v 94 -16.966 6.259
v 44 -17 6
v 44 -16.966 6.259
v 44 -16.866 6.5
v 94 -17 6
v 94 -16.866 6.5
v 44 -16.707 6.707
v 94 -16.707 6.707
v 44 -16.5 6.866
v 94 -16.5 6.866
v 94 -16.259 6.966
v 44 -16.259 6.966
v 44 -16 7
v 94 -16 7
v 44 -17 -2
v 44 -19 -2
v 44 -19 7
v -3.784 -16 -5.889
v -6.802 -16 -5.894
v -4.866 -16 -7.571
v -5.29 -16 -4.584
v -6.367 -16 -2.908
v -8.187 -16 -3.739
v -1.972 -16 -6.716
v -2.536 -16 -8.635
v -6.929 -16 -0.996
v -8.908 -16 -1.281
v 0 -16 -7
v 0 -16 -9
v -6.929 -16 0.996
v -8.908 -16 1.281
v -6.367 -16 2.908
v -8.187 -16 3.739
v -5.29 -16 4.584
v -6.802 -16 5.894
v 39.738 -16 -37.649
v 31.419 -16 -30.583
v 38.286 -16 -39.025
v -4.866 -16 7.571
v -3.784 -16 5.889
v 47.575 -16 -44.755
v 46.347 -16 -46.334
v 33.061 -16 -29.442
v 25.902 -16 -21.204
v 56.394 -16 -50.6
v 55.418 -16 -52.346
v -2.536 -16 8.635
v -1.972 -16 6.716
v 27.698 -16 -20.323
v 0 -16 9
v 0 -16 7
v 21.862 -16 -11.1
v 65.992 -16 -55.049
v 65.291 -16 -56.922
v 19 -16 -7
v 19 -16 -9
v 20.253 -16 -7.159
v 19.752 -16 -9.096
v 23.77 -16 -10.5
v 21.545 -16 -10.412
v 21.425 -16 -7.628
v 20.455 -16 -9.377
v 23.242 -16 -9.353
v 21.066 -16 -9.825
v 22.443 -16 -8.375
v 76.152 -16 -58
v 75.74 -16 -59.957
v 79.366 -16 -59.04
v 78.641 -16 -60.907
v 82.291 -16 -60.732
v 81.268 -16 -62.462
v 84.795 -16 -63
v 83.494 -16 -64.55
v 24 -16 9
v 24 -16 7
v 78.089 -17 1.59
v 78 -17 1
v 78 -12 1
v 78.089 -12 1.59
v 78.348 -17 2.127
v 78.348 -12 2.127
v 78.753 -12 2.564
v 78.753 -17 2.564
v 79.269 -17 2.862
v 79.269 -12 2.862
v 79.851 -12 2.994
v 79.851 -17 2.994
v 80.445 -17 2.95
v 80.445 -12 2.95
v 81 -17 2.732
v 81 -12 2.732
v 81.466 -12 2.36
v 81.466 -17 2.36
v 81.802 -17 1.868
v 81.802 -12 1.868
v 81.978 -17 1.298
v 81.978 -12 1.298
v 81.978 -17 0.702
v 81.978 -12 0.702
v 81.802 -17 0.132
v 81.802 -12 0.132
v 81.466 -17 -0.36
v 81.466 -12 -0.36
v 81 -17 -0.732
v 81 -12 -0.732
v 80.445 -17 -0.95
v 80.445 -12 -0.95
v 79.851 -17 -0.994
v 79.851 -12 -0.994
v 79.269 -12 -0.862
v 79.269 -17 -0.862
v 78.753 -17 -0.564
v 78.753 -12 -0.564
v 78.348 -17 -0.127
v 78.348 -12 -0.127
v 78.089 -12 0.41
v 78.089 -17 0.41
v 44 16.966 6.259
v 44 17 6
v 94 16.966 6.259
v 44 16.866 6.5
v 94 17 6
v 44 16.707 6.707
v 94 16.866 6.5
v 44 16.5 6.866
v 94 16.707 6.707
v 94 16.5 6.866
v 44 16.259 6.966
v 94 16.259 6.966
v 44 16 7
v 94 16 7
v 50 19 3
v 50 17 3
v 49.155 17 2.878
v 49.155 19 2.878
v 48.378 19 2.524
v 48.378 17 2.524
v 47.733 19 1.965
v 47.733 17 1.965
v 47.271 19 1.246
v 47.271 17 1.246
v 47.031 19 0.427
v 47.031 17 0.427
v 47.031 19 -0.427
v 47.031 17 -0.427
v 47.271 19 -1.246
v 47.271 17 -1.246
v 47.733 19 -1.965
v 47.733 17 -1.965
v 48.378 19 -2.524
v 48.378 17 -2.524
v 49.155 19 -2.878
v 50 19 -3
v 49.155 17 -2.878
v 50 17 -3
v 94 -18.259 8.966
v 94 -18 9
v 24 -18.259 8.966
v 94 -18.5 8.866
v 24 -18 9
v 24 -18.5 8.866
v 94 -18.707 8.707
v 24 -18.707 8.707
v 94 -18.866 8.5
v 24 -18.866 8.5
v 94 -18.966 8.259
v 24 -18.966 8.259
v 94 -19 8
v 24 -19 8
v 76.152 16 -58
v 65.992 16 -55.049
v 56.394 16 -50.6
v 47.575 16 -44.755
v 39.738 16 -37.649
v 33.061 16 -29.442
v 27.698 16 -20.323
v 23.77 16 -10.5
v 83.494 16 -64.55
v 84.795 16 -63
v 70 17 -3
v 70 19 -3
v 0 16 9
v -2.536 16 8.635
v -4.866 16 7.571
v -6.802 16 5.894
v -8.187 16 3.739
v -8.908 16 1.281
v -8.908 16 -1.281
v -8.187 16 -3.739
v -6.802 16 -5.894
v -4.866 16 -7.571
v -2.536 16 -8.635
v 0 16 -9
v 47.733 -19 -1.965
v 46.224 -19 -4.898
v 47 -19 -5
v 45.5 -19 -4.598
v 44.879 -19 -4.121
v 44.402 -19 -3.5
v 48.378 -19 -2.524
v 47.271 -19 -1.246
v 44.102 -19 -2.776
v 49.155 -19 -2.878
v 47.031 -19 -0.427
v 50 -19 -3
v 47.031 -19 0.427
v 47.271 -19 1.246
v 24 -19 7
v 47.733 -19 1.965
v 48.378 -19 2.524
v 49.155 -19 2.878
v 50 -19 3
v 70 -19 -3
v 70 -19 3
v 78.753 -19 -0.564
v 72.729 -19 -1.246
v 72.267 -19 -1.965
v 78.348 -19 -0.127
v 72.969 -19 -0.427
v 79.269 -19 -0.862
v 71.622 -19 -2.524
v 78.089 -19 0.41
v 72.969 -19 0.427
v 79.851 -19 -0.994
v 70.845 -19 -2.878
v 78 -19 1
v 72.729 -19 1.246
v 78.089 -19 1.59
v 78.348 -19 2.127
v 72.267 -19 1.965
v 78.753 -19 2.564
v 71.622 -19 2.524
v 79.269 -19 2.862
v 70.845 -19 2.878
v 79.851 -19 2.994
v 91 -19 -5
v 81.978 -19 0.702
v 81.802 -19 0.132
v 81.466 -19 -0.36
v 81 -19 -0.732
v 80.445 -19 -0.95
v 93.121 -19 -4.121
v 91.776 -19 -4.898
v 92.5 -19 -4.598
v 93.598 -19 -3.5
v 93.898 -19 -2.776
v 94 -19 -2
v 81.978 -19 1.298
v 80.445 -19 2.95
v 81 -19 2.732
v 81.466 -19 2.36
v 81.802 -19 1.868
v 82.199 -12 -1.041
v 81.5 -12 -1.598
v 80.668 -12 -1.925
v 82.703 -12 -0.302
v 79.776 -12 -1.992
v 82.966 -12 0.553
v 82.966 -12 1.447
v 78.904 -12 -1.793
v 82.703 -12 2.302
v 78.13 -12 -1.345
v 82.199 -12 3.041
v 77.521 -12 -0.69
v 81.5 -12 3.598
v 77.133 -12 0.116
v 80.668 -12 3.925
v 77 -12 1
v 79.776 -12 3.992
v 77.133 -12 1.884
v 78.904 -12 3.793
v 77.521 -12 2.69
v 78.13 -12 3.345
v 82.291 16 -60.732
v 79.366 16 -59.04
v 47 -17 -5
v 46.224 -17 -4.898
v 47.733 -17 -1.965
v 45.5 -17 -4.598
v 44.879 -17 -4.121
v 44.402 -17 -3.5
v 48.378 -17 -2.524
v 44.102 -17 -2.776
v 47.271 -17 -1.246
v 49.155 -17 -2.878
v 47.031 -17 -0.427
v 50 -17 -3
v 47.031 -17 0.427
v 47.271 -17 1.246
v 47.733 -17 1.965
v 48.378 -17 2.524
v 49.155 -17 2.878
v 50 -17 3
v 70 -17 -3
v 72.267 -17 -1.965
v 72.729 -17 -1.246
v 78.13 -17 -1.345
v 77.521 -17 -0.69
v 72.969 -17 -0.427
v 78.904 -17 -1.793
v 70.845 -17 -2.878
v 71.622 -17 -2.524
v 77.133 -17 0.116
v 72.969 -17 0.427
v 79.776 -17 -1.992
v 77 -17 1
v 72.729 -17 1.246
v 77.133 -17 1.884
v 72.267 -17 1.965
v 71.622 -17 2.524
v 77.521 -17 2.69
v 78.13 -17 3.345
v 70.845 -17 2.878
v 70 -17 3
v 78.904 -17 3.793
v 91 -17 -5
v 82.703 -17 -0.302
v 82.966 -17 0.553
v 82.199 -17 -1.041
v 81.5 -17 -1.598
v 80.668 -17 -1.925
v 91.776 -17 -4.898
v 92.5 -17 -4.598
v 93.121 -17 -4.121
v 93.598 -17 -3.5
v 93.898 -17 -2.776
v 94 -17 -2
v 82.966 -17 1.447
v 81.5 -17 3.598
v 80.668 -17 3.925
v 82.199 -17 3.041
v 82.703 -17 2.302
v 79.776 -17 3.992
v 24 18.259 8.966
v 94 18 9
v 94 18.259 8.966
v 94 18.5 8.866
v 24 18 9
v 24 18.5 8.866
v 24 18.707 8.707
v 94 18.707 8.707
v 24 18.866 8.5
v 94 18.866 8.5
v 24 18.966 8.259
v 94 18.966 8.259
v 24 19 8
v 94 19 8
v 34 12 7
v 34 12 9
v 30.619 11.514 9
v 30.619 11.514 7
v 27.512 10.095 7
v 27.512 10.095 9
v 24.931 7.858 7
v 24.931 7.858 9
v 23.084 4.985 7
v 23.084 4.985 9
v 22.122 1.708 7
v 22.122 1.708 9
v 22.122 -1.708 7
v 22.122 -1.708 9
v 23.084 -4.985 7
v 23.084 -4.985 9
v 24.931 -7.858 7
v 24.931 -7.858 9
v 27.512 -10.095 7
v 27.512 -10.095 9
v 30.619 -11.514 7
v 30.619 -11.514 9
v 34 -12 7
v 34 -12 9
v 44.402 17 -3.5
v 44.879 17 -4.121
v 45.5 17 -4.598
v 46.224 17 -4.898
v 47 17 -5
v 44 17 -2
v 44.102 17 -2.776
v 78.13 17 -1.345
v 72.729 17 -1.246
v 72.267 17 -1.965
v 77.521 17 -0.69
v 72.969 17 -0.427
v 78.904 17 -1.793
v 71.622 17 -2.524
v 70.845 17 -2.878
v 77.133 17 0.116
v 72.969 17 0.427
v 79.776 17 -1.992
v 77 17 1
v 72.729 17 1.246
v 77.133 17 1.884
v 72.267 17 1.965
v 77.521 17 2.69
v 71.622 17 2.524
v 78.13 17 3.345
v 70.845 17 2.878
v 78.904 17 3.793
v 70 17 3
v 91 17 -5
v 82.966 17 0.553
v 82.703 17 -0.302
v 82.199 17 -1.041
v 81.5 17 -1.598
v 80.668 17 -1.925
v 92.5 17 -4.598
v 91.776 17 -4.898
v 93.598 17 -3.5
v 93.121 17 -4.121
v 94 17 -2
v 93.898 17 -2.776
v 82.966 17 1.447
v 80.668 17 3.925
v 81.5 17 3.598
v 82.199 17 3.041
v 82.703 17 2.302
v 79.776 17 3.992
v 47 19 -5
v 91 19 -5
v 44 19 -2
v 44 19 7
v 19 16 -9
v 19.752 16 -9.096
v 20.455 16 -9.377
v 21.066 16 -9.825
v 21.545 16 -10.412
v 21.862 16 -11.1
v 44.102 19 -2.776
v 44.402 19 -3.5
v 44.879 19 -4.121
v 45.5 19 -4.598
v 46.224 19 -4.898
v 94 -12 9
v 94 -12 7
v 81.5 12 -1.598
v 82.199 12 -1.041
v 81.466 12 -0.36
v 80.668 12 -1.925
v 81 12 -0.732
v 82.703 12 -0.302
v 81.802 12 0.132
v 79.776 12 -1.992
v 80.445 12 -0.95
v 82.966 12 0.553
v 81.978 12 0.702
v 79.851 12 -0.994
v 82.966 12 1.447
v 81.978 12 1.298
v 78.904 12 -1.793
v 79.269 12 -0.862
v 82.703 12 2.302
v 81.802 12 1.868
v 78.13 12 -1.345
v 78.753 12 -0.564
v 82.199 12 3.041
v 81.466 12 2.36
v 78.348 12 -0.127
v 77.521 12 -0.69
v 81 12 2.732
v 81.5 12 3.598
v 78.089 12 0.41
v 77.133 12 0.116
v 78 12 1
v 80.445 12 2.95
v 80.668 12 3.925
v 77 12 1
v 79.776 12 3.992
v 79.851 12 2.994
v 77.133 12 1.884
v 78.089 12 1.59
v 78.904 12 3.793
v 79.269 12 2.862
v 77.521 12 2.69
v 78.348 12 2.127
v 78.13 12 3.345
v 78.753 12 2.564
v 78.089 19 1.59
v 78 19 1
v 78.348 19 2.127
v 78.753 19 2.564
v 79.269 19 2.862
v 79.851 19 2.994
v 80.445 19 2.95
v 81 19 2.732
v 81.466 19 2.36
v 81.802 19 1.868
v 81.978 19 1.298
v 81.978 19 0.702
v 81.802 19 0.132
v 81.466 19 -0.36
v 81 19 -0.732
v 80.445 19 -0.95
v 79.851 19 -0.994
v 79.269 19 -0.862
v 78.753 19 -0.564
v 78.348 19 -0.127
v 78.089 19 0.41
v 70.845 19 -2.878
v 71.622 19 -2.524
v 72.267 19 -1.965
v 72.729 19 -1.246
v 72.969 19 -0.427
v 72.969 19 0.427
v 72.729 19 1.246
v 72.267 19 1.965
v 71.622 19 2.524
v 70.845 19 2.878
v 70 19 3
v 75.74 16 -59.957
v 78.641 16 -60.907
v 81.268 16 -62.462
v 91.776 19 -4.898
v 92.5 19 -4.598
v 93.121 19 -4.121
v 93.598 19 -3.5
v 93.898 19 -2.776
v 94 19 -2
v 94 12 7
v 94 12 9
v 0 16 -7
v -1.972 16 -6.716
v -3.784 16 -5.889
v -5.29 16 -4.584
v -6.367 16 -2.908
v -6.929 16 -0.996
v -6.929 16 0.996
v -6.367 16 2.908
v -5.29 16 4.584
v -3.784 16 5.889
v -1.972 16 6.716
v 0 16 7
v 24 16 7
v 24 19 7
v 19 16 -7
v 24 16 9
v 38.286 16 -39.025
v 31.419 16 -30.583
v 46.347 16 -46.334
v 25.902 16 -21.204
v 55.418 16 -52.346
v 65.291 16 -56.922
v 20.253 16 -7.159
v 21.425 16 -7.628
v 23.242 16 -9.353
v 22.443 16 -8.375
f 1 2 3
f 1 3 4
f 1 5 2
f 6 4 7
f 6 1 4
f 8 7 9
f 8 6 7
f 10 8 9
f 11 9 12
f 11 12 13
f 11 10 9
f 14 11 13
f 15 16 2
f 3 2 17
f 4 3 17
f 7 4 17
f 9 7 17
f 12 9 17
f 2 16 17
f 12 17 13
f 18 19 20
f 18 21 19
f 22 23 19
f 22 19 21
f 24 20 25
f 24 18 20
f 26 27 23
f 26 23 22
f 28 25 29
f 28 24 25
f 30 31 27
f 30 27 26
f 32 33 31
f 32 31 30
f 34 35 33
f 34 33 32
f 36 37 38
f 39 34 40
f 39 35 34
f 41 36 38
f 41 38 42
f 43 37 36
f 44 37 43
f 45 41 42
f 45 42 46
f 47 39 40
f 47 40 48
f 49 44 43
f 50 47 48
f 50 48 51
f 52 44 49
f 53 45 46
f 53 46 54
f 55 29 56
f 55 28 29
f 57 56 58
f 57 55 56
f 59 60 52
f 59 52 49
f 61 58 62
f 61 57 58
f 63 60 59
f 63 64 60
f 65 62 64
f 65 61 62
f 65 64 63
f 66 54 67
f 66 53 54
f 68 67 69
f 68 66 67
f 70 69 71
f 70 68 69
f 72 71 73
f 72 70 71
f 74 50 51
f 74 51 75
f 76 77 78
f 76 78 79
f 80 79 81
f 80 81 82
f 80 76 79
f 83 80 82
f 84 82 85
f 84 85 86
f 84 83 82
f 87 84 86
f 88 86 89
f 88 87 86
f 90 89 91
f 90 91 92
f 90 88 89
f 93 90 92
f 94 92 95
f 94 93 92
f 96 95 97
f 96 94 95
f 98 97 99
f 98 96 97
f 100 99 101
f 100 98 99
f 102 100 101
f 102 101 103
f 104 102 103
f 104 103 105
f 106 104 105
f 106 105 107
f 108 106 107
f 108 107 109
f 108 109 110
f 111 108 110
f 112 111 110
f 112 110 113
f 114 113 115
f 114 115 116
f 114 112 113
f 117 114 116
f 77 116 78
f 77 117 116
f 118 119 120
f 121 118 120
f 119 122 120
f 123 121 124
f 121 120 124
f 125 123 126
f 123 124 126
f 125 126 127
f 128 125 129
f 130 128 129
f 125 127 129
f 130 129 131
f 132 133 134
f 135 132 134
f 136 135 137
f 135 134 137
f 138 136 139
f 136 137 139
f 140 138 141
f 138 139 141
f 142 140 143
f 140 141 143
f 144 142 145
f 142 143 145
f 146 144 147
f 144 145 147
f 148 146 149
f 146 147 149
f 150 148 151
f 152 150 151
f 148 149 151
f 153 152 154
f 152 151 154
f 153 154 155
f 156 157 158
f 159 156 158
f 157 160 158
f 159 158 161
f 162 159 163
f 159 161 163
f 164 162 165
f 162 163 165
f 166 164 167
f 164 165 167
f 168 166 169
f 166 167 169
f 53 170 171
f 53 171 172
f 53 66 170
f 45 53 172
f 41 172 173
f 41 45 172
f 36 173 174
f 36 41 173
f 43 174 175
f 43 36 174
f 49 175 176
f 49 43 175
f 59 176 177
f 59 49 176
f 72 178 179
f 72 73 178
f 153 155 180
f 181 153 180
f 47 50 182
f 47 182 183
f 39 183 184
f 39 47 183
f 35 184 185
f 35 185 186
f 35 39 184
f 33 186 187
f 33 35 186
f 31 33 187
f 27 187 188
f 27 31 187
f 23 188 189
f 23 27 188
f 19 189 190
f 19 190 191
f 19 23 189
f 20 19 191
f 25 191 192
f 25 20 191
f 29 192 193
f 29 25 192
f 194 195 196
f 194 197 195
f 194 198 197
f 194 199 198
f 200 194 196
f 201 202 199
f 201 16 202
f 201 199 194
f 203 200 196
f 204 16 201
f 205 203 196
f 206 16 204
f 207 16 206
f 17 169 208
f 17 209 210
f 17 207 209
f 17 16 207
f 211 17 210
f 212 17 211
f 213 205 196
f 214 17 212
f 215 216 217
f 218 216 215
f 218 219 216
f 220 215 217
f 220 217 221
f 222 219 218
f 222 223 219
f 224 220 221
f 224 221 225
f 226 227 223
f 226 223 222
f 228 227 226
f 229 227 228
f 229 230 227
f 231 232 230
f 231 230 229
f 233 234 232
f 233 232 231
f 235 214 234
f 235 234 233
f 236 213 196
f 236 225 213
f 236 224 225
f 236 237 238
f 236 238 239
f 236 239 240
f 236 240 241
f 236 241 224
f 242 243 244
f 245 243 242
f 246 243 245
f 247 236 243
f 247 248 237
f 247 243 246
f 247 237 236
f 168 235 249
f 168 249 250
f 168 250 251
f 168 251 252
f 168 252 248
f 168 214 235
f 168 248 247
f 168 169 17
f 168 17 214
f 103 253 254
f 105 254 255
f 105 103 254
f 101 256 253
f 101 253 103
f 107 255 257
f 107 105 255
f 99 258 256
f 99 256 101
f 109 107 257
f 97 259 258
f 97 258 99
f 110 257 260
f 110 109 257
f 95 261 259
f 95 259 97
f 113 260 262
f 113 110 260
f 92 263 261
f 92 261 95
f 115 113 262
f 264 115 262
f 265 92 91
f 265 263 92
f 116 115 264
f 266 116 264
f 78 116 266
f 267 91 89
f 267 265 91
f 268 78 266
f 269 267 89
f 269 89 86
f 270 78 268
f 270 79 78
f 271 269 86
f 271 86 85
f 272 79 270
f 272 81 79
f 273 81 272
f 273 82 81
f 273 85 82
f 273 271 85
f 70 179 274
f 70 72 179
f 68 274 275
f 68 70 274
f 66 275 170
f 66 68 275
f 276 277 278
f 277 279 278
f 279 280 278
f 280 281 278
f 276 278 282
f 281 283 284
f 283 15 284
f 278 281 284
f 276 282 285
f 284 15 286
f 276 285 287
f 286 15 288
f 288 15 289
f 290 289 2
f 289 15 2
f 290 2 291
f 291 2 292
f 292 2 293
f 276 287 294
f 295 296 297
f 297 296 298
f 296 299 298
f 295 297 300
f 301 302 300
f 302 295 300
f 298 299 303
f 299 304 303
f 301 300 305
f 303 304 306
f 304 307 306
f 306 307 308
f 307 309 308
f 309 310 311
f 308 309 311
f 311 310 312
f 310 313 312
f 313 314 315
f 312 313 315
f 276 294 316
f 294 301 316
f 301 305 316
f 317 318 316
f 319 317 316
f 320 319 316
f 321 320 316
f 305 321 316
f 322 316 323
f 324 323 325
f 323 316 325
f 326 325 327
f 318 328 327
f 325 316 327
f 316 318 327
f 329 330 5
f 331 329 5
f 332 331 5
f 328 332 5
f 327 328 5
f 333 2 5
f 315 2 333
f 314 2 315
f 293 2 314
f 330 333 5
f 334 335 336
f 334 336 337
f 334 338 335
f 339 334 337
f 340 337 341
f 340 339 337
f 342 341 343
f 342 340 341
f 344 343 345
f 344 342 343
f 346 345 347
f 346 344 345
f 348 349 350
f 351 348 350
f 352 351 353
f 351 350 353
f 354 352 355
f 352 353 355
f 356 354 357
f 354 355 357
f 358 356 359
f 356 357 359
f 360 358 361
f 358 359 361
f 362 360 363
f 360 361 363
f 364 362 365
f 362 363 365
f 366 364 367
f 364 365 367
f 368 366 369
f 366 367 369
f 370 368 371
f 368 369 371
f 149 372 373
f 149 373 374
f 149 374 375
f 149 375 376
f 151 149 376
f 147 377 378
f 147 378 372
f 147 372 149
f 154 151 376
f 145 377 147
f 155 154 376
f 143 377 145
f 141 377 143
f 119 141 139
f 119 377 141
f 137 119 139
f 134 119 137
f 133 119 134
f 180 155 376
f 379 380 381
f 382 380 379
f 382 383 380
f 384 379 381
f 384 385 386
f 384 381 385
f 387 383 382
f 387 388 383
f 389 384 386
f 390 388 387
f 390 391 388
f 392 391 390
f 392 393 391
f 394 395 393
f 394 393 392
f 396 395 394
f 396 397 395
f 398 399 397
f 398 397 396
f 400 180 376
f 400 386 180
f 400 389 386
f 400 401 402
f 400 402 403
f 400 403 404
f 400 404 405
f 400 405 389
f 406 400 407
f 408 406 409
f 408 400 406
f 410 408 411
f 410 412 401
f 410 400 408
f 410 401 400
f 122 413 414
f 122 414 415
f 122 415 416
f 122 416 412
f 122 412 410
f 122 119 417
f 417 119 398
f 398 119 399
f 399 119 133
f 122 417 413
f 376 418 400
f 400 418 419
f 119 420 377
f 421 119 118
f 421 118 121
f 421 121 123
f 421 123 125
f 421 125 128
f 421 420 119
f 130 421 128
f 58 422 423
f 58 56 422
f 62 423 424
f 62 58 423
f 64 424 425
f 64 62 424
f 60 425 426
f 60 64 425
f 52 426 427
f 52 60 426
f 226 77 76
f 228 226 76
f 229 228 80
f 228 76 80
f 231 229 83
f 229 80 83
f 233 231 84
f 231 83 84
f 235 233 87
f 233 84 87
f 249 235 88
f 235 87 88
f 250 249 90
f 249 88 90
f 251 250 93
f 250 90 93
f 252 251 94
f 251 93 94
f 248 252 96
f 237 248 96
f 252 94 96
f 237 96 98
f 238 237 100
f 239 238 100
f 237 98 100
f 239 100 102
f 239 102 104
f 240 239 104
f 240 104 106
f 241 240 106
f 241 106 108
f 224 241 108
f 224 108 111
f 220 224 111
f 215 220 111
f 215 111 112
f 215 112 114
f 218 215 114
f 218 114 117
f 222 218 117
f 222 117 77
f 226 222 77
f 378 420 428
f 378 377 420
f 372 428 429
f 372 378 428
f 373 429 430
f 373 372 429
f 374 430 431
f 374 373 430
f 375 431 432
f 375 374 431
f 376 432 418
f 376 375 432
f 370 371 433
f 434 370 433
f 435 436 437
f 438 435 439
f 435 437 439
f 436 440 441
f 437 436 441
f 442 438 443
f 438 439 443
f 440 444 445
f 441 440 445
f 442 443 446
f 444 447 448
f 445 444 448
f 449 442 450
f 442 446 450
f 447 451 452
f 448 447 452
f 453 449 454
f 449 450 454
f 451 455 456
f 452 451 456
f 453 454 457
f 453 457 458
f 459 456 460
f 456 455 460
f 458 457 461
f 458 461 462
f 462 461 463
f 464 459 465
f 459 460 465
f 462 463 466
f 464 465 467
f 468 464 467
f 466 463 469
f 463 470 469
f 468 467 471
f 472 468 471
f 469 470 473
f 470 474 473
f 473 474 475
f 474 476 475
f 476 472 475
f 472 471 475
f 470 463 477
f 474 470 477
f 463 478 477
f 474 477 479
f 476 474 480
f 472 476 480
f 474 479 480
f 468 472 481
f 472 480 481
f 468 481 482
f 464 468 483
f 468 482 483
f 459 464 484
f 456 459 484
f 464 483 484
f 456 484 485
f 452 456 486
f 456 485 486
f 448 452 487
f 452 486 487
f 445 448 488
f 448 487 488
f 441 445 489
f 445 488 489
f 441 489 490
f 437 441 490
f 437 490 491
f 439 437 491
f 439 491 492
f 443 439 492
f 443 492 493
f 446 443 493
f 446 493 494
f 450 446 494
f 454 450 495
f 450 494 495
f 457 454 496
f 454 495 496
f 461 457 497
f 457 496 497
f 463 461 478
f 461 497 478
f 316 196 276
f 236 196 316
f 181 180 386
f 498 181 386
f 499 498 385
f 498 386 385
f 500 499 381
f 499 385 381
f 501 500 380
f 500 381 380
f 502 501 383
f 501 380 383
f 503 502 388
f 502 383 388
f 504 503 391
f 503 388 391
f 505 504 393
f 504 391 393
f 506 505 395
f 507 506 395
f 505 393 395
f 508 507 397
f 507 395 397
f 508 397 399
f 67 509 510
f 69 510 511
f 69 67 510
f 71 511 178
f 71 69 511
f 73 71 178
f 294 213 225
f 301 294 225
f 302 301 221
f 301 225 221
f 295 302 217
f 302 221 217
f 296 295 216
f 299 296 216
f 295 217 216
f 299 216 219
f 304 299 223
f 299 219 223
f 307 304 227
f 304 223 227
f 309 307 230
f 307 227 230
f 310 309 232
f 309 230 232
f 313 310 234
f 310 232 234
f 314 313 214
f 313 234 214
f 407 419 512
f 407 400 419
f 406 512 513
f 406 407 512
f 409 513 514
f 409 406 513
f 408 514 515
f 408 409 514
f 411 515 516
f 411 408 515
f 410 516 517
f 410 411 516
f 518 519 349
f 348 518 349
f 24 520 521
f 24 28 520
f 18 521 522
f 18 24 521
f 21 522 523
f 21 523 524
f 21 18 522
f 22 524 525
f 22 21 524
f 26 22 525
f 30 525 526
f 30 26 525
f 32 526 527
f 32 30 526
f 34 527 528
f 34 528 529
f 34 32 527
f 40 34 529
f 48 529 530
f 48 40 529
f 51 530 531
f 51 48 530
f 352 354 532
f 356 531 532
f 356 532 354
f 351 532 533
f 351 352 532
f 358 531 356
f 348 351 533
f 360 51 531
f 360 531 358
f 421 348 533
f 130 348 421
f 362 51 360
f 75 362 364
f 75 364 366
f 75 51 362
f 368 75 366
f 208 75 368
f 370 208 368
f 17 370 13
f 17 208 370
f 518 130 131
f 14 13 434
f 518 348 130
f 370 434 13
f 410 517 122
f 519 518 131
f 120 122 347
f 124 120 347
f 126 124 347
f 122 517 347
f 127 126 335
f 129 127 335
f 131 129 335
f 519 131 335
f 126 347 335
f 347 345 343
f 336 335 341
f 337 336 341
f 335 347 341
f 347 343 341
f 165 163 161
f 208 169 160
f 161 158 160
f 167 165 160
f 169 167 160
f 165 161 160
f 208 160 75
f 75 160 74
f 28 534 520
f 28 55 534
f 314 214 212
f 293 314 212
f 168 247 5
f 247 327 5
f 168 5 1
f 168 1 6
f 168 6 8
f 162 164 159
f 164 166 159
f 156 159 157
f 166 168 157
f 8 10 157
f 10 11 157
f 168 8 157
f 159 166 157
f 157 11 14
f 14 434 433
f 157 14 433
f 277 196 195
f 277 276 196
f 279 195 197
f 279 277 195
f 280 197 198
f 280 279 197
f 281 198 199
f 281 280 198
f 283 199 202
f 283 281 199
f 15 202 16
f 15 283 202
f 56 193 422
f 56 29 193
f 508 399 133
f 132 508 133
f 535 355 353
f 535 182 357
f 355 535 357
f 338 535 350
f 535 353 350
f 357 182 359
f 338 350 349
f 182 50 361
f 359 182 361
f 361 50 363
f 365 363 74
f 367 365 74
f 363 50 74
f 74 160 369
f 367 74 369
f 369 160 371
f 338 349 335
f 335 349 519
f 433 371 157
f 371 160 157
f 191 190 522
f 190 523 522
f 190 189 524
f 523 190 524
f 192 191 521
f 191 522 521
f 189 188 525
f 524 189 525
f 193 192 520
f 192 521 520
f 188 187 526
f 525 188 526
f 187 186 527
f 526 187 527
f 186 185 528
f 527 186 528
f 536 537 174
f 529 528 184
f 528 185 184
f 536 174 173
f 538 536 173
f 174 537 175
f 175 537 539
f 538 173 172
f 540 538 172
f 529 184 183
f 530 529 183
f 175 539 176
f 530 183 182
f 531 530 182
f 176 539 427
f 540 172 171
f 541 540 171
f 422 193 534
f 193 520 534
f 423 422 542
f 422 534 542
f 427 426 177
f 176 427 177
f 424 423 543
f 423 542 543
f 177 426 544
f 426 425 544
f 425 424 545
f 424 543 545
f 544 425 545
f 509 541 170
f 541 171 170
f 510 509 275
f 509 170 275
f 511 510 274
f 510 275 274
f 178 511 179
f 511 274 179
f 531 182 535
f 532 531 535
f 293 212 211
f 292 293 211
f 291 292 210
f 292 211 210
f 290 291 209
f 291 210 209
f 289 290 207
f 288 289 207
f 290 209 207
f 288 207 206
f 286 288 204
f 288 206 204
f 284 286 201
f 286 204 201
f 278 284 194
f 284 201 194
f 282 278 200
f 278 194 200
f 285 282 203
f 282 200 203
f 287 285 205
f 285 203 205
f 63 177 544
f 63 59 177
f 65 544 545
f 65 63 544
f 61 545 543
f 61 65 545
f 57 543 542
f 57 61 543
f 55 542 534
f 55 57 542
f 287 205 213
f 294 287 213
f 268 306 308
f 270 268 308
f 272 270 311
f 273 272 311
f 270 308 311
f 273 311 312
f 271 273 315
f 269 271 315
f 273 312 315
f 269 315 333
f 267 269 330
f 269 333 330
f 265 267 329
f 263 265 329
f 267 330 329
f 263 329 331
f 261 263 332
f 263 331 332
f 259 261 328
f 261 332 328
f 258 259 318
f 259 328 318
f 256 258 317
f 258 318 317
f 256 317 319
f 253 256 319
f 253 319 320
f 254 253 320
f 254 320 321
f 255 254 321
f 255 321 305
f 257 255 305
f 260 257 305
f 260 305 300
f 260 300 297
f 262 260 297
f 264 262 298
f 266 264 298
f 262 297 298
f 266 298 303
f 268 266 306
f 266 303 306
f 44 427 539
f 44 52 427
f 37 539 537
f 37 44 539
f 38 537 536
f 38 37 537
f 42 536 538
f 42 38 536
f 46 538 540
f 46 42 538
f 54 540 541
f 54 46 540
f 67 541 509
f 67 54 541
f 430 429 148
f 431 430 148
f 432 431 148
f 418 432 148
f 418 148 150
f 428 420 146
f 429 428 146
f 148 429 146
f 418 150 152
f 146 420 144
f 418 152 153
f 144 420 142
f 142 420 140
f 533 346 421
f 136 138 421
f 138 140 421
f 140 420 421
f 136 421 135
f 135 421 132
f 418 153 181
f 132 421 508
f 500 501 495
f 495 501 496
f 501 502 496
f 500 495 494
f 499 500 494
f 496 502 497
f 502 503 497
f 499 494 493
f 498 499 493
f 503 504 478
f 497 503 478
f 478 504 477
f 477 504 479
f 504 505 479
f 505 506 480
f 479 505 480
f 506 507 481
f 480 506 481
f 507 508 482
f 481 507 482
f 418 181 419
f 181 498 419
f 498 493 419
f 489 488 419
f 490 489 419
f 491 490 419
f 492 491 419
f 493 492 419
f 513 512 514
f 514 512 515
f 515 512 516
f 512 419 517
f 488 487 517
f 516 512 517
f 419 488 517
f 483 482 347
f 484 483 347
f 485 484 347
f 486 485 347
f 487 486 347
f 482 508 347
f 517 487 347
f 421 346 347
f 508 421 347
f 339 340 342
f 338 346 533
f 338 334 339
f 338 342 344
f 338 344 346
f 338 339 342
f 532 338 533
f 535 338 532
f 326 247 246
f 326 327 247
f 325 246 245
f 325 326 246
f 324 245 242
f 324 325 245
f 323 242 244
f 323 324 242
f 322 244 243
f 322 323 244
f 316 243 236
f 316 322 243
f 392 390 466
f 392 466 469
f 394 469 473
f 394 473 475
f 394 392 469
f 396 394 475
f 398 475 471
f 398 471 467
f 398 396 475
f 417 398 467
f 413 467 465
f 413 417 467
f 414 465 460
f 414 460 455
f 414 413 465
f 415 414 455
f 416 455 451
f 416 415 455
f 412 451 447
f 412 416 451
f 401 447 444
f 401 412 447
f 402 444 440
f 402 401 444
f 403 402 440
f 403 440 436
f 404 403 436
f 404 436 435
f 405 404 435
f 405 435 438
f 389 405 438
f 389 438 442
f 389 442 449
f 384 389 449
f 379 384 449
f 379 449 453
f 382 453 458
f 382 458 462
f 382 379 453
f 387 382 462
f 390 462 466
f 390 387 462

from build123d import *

# Parameters (mm, degrees)
F1_DEPTH  = 16
F2_W      = 70
F2_H      = 3
F3_DEPTH  = 2
F4_W      = 50
F4_H      = 14
F5_DEPTH  = 2
F6_R      = 1
F9_DEPTH  = 2
F11_DEPTH = 38.001
F13_D     = 4
F14_R     = 3
F14_R_2   = 2
F15_DEPTH = 5
F16_R     = 3


# Not quite as in the source:
# - a pattern or mirror of a feature is missing from the dataset's text; its kind, count and spacing are read off the source's solid


with BuildPart() as f1:
    # F0 (on Front) → F1 (new body)
    with BuildSketch(Plane.XZ):
        with BuildLine():
            Line((94, 9), (0, 9))
            ThreePointArc((0, 9), (-9, 0), (0, -9))
            Line((0, -9), (19, -9))
            ThreePointArc((19, -9), (20.7747485708, -9.5812673752), (21.8617615127, -11.0998216597))
            ThreePointArc((21.8617615127, -11.0998216597), (42.1784205856, -42.831899352), (75.7404983282, -59.9572702431))
            ThreePointArc((75.7404983282, -59.9572702431), (79.997153255, -61.6128288571), (83.4944279816, -64.5503541724))
            Line((83.4944279816, -64.5503541724), (84.7953295958, -63))
            ThreePointArc((84.7953295958, -63), (80.8735692863, -59.8084227638), (76.1517077584, -58))
            ThreePointArc((76.1517077584, -58), (43.5219099532, -41.3503338559), (23.7696025212, -10.4997027661))
            ThreePointArc((23.7696025212, -10.4997027661), (21.9579142847, -7.9687789586), (19, -7))
            Line((19, -7), (0, -7))
            ThreePointArc((0, -7), (-7, 0), (0, 7))
            Line((0, 7), (94, 7))
            Line((94, 7), (94, 9))
        make_face()
    extrude(amount=F1_DEPTH)

    # F2 (on face) → F3 (join)
    with BuildSketch(Plane.XY.offset(9)):
        with Locations((59, -17.5)):
            Rectangle(F2_W, F2_H)
    extrude(amount=-F3_DEPTH)

    # F4 (on face) → F5 (join)
    with BuildSketch(Plane.XZ.offset(19)):
        with Locations((69, 2)):
            Rectangle(F4_W, F4_H)
    extrude(amount=-F5_DEPTH)

    # F6
    f6_edges = [f1.edges().sort_by_distance(p)[0] for p in [
        (59, -19, 9),
        (69, -17, 7),
    ]]
    fillet(f6_edges, radius=F6_R)

    # F7: F1 across plane


with BuildPart() as f1_1:
    add(f1.part)
    add(f1.part.mirror(Plane.XZ))

    # F8 (on face) → F9 (cut)
    with BuildSketch(Plane.XY.offset(9)):
        with BuildLine():
            Line((94, 12), (34, 12))
            ThreePointArc((34, 12), (22, 0), (34, -12))
            Line((34, -12), (94, -12))
            Line((94, -12), (94, 12))
        make_face()
    extrude(amount=-F9_DEPTH, mode=Mode.SUBTRACT)

    # F10 (on face) → F11 (cut, through all)
    with BuildSketch(Plane.XZ.offset(19)):
        with BuildLine():
            ThreePointArc((50, 3), (47, 0), (50, -3))
            Line((50, -3), (70, -3))
            ThreePointArc((70, -3), (73, 0), (70, 3))
            Line((70, 3), (50, 3))
        make_face()
    extrude(amount=-F11_DEPTH, mode=Mode.SUBTRACT)

    # F13 (through all)
    with Locations(Plane.XZ.offset(19)):
        with Locations((80, 1)):
            Hole(F13_D / 2)

    # F14 (on face) → F15 (join)
    with BuildSketch(Plane(origin=(0, -17, 0), x_dir=(-1, 0, 0), z_dir=(0, 1, 0))):
        with Locations((-80, 1)):
            Circle(F14_R)
        with Locations((-80, 1)):
            Circle(F14_R_2, mode=Mode.SUBTRACT)
    f15 = extrude(amount=F15_DEPTH)

    # F15_copies: F15 across plane
    add(f15.mirror(Plane.ZX))

    # F16
    f16_edges = [f1_1.edges().sort_by_distance(p)[0] for p in [
        (94, -18, -5),
        (94, 18, -5),
        (44, 18, -5),
        (44, -18, -5),
    ]]
    fillet(f16_edges, radius=F16_R)


solid = f1_1.part
